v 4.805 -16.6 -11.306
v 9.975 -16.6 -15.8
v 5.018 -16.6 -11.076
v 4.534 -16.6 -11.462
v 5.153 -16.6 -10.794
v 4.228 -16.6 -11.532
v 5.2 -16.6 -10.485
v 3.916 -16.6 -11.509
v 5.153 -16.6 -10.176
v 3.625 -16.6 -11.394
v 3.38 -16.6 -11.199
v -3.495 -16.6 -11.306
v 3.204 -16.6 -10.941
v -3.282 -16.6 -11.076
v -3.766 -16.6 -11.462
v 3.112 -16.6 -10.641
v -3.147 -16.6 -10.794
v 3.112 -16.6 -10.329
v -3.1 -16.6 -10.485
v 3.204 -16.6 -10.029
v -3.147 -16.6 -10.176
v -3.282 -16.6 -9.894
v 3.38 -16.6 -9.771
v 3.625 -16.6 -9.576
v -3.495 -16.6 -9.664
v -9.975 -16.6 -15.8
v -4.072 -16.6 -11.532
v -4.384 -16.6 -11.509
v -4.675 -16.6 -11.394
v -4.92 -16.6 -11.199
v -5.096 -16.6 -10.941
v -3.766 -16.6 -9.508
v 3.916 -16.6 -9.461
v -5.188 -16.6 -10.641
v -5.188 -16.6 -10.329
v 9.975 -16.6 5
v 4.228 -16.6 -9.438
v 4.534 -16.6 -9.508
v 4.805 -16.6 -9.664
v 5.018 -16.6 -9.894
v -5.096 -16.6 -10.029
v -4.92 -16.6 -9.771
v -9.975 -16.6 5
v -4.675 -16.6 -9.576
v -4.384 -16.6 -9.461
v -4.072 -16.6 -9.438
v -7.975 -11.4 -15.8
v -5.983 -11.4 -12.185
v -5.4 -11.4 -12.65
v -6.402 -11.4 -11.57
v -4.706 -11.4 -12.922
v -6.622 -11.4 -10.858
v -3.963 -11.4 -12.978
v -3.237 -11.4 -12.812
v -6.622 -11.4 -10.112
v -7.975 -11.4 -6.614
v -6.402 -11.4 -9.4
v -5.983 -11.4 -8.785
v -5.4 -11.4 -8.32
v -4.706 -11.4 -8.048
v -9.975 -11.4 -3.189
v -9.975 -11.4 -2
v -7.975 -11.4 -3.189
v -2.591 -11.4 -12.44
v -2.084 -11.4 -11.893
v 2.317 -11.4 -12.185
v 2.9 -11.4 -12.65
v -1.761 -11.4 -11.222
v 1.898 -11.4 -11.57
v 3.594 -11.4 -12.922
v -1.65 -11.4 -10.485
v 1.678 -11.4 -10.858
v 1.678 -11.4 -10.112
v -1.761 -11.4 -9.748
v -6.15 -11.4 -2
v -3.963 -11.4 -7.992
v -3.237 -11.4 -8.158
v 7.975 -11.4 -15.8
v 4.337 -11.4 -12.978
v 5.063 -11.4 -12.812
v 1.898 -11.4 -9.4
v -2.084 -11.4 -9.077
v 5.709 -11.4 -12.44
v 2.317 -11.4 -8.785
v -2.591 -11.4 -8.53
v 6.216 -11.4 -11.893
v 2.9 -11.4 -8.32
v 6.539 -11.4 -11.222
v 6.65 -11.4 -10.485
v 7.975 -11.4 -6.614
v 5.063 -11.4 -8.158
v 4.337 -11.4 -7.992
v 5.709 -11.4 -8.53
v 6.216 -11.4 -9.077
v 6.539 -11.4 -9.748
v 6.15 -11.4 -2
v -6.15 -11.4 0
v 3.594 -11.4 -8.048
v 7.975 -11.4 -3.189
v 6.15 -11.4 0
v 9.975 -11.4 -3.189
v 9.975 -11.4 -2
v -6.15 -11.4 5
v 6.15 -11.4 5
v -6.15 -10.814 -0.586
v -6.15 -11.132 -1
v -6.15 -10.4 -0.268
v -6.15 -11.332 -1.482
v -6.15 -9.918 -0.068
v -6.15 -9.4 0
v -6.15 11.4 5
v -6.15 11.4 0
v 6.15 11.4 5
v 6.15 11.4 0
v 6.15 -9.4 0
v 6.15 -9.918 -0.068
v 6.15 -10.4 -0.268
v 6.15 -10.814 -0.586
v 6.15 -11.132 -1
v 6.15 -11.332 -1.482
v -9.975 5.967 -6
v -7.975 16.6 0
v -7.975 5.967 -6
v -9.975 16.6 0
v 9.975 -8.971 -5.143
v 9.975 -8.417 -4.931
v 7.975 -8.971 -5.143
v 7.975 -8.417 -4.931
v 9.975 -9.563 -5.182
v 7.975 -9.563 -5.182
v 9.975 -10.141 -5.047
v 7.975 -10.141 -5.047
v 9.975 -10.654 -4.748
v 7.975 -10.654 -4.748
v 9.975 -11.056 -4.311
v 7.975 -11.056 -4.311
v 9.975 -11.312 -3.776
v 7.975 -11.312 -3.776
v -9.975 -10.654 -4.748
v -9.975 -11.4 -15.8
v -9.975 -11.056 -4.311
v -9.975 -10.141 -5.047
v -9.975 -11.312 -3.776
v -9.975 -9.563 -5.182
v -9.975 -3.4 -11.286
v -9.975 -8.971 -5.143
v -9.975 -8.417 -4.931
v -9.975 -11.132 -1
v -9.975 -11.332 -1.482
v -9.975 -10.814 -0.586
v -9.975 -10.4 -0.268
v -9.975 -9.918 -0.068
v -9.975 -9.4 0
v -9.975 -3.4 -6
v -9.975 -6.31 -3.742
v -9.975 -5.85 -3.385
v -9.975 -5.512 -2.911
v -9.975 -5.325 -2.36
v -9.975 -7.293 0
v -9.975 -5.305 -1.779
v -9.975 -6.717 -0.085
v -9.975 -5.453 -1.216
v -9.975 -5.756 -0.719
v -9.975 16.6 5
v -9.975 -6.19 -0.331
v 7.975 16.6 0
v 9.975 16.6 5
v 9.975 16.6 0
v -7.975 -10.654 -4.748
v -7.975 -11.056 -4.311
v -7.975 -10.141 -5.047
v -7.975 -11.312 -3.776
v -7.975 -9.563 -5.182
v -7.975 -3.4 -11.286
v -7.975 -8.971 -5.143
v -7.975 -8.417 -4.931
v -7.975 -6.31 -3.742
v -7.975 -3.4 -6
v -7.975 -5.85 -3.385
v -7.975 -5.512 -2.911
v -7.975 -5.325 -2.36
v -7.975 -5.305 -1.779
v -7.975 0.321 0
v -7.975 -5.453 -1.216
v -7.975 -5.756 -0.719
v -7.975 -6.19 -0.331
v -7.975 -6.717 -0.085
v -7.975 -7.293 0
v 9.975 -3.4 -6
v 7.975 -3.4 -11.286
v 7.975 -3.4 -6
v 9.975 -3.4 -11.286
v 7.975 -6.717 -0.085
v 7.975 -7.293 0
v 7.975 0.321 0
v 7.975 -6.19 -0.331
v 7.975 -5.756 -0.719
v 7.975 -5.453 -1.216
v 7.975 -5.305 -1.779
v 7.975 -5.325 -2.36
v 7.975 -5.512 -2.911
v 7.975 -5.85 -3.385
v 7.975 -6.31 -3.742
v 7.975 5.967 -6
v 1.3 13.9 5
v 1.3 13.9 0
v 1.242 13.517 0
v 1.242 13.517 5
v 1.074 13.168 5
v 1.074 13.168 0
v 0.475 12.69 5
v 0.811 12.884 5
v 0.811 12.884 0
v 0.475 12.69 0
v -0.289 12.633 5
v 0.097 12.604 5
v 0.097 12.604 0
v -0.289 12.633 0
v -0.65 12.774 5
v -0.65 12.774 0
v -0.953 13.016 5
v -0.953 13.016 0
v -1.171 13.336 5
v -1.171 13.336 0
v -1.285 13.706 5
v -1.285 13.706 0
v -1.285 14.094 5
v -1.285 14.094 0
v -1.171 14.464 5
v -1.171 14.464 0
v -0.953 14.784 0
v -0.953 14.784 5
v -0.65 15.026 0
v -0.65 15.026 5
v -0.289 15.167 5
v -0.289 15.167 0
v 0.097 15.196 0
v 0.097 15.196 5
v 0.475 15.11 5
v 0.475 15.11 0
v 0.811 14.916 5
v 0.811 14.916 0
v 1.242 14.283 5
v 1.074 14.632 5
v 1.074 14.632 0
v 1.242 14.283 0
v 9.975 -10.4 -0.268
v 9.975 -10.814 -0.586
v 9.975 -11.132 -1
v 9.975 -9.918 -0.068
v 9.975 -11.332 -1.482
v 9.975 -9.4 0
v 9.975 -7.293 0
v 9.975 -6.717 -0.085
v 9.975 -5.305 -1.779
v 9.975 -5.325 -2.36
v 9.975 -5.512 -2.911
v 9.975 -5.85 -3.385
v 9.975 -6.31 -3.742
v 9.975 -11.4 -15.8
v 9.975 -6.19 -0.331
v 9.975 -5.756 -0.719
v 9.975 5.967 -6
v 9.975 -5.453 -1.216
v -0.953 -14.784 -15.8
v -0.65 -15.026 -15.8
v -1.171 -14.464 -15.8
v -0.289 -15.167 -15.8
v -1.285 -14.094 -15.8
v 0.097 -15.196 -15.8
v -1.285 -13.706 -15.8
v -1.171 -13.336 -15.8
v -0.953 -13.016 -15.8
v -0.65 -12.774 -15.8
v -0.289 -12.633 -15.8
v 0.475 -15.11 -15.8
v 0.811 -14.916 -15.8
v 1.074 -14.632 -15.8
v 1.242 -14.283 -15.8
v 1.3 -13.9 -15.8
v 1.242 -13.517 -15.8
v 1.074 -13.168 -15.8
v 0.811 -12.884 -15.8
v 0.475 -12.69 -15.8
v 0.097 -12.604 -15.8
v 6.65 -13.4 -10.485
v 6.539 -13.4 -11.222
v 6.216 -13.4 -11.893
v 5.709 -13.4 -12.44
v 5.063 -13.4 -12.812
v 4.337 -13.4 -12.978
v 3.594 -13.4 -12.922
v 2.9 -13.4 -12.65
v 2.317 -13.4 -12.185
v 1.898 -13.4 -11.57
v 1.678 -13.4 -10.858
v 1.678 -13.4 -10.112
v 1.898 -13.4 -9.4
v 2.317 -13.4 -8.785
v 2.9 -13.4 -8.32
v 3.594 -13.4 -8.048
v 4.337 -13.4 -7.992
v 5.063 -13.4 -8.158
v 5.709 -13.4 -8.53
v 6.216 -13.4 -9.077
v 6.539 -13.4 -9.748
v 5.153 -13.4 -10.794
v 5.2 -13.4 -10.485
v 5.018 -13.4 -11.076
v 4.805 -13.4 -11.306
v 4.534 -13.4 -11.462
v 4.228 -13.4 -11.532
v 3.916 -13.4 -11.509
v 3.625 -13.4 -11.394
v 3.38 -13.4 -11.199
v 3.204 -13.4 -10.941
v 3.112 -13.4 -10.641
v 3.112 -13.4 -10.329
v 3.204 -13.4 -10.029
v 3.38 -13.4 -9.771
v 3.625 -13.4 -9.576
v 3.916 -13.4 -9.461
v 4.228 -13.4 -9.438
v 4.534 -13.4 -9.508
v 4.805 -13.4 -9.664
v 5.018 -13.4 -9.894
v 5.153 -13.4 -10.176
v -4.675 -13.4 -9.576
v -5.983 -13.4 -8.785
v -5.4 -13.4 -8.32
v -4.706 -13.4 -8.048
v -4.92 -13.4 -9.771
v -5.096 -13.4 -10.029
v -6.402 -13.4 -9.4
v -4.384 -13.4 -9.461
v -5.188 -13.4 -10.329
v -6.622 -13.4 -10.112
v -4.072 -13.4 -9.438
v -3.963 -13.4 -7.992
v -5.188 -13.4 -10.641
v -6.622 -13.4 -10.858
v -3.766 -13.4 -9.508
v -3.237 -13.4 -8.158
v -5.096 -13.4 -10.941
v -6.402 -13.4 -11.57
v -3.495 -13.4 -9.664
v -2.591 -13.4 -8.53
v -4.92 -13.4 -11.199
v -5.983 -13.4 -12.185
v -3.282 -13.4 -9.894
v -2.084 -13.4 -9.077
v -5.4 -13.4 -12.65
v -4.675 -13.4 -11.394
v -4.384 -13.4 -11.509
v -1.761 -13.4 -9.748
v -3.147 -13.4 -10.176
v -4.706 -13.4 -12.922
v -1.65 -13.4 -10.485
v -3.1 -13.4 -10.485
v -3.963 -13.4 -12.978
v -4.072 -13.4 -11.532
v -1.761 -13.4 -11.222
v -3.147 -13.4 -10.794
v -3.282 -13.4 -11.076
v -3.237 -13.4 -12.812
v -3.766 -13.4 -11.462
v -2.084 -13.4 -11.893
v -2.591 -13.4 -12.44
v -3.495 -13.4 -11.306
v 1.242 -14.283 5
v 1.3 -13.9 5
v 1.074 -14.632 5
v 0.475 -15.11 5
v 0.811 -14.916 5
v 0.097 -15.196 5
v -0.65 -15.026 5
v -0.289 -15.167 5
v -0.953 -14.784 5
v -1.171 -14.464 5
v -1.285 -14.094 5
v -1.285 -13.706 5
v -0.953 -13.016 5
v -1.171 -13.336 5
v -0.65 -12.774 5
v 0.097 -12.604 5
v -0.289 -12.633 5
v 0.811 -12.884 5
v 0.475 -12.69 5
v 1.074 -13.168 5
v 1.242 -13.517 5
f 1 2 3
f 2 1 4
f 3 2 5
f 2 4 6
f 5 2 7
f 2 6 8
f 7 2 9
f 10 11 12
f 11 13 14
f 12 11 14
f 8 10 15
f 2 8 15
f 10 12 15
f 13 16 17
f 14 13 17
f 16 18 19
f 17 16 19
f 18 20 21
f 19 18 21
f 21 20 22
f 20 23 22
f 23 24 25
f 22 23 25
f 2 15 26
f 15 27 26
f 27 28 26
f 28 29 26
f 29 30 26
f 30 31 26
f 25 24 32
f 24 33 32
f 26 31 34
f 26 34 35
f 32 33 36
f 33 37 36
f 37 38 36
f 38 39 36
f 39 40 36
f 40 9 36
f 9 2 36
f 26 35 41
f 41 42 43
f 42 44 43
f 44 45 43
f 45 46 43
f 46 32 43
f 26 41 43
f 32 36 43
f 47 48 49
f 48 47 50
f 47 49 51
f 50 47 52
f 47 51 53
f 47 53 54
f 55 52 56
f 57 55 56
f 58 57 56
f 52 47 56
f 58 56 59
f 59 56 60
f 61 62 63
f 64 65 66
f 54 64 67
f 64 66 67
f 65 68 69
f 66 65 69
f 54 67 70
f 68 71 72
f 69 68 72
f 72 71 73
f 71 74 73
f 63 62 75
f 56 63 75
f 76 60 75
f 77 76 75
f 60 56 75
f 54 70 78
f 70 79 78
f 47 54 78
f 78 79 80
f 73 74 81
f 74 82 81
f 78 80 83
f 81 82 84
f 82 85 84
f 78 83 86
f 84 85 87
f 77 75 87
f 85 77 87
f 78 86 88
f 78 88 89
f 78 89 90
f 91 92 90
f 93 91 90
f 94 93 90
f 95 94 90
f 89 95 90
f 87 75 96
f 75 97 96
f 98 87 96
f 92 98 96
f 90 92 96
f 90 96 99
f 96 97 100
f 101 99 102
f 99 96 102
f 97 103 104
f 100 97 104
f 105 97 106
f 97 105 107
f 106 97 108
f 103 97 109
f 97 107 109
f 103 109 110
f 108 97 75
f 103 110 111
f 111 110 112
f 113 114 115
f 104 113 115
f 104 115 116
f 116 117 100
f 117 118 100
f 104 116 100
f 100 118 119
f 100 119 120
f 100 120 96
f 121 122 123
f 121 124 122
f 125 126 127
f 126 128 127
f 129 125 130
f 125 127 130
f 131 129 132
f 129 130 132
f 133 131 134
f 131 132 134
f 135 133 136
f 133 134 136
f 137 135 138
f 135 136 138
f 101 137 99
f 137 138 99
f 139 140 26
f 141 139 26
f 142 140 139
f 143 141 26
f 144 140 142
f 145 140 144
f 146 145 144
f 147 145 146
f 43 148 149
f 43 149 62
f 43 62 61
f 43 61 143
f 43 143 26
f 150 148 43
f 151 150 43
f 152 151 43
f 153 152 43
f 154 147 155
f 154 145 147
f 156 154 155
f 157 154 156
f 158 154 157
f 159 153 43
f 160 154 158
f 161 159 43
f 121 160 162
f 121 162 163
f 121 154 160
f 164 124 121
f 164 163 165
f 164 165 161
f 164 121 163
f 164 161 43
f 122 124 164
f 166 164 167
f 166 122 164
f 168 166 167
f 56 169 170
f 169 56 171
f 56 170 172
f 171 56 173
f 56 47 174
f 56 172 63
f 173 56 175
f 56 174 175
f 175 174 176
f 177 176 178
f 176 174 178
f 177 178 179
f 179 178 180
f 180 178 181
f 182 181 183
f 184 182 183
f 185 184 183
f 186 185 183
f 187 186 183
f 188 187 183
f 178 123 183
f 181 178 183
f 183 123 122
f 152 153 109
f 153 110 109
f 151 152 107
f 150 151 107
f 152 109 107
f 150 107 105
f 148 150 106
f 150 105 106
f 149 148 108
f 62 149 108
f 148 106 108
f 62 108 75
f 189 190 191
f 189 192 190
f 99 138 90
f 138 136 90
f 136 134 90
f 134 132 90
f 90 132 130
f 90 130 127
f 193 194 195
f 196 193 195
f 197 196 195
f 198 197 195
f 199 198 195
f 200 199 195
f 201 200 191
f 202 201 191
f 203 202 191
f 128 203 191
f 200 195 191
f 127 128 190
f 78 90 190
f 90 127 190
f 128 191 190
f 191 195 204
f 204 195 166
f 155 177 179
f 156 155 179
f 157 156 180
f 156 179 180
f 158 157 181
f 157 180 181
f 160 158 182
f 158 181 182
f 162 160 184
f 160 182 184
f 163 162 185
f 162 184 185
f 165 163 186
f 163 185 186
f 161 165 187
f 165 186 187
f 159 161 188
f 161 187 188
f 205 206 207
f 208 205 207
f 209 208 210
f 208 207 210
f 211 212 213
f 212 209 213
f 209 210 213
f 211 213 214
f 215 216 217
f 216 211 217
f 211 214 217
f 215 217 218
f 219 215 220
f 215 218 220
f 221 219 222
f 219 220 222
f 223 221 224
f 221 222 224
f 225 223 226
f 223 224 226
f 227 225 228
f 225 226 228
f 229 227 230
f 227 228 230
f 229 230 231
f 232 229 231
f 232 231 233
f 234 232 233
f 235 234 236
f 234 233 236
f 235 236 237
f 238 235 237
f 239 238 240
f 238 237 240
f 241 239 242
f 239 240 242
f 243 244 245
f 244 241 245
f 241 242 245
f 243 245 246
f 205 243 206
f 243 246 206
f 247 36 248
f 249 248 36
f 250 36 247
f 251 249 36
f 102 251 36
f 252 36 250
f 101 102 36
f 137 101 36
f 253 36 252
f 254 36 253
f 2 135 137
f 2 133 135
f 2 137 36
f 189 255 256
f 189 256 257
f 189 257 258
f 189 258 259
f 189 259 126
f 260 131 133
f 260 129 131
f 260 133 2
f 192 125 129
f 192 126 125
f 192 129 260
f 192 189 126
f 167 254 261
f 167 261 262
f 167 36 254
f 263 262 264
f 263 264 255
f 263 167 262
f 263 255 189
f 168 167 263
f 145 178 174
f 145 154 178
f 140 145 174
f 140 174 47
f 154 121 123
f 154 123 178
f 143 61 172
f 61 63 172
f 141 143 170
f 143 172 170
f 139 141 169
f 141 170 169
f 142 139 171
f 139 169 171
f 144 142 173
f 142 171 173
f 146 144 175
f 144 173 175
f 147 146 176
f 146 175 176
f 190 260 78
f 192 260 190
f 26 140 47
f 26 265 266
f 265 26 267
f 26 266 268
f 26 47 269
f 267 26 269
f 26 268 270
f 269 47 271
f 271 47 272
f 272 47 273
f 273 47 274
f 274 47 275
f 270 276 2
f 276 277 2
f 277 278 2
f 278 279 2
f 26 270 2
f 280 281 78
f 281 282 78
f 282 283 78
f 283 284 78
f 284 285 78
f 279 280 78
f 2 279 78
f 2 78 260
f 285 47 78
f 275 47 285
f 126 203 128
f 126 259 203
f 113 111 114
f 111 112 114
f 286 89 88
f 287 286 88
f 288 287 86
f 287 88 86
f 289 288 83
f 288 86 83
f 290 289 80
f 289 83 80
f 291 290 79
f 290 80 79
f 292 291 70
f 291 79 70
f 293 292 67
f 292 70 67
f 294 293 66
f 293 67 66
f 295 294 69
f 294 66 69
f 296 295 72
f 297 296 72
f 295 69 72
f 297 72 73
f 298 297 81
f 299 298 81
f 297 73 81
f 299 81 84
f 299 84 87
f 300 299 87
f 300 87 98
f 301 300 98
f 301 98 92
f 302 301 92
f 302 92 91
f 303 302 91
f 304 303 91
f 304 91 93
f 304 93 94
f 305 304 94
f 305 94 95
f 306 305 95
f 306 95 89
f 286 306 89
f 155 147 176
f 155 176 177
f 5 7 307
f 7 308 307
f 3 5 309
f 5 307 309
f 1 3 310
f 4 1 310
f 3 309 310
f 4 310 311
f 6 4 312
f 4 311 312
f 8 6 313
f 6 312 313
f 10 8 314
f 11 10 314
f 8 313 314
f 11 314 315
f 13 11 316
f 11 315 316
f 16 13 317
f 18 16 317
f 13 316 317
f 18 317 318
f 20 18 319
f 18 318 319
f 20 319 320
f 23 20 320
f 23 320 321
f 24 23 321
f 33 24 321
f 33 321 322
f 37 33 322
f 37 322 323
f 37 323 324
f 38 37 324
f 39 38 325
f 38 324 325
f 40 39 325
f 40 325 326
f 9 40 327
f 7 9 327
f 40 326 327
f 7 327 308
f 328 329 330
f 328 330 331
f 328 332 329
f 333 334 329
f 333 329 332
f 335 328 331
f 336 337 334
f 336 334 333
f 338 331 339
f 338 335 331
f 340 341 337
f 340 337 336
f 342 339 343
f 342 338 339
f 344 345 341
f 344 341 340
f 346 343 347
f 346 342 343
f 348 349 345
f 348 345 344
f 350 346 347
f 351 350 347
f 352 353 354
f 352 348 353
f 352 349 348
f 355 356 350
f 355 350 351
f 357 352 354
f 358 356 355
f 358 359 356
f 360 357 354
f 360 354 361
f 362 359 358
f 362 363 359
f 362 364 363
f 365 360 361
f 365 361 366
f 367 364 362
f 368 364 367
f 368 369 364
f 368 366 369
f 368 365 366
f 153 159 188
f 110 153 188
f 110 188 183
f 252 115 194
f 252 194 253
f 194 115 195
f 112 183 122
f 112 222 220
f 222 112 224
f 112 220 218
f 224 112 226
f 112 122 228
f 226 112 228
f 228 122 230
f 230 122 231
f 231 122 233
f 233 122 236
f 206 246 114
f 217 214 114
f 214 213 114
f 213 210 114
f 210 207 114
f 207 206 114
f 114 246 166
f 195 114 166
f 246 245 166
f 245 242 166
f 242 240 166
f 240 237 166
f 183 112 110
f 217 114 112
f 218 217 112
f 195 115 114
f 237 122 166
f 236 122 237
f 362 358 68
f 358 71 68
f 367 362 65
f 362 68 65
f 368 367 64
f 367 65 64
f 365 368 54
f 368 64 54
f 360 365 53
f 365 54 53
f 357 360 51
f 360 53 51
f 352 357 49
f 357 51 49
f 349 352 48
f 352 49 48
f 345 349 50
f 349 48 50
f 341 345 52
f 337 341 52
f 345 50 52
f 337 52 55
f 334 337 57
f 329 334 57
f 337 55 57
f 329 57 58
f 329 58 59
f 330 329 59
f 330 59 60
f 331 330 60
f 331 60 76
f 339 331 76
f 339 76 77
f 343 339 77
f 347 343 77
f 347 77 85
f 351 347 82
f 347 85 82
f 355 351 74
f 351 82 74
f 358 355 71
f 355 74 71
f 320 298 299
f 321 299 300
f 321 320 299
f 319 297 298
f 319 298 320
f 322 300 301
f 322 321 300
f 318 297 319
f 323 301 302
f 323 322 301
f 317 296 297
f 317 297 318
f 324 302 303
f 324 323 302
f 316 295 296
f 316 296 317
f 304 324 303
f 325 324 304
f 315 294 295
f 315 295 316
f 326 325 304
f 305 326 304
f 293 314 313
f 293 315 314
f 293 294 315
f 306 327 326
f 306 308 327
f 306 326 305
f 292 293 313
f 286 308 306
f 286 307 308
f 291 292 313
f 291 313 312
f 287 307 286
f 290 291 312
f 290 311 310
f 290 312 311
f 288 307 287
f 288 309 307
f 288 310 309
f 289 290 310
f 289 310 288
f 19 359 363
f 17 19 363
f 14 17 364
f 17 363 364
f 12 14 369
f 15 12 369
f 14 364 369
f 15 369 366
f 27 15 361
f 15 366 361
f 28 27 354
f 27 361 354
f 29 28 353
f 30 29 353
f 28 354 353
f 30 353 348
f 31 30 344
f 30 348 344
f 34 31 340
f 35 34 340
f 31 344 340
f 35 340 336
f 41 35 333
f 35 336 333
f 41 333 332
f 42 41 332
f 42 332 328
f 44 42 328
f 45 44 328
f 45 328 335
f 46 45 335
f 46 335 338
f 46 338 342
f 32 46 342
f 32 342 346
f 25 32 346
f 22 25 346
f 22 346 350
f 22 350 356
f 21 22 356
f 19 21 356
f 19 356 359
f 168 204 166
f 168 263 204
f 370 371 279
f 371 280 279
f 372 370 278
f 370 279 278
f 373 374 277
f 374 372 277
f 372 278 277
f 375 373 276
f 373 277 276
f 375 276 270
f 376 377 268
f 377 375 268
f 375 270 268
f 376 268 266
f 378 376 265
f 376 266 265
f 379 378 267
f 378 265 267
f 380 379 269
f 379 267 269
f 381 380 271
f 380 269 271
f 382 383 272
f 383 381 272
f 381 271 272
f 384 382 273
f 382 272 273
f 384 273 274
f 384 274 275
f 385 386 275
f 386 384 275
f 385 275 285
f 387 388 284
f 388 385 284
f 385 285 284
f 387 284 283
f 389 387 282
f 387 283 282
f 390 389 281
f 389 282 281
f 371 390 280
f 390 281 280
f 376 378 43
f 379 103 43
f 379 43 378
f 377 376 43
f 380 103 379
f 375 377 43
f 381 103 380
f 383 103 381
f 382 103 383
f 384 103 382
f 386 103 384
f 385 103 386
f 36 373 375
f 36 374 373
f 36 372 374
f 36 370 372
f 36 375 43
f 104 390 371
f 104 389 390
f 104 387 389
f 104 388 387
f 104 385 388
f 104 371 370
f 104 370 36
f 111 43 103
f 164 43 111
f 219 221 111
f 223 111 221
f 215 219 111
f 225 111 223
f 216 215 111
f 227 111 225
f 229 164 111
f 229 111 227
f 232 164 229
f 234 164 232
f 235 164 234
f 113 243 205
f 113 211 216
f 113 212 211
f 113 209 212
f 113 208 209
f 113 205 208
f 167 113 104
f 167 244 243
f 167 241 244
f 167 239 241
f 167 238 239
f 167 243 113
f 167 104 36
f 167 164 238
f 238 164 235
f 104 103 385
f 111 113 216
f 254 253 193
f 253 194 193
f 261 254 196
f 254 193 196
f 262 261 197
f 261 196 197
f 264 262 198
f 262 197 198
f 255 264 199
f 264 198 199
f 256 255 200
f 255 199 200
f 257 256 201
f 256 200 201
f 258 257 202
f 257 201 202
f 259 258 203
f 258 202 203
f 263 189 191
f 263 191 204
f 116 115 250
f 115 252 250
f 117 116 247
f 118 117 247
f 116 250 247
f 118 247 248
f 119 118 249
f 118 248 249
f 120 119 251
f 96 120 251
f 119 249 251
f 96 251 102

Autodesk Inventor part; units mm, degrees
ref_plane "YZ Plane" through (0, 0, 0) normal (1, 0, 0) x (0, 1, 0)
sketch "Sketch1" plane through (0, 0, 0) normal (0, 0, 1) x (1, 0, 0)
  line L0 (-9.975, 16.6) -> (9.975, 16.6)
  line L1 (9.975, 16.6) -> (9.975, -16.6)
  line L2 (9.975, -16.6) -> (-9.975, -16.6)
  line L3 (-9.975, -16.6) -> (-9.975, 16.6)
  line L4 (0, 0) -> (0, 11.4) construction
  line L5 (0, 0) -> (15.5803, 0) construction
  line L6 (-6.15, 11.4) -> (6.15, 11.4)
  line L7 (6.15, 11.4) -> (6.15, -11.4)
  line L8 (6.15, -11.4) -> (-6.15, -11.4)
  line L9 (-6.15, -11.4) -> (-6.15, 11.4)
  circle A0 centre (0, 13.9) radius 1.3
  circle A1 centre (0, -13.9) radius 1.3
  line L10 (-15.0861, 0) -> (20.6914, 0) projected
  line L11 (9.975, -16.6) -> (-9.975, -16.6)
  line L12 (-9.975, -16.6) -> (-9.975, -11.4)
  line L13 (-9.975, -11.4) -> (9.975, -11.4)
  line L14 (9.975, -11.4) -> (9.975, -16.6)
  line L15 (0, 11.4) -> (0, 13.9) construction
  point P0 (0, 16.6)
  dimension "d0" = 2.6
  dimension "d1" = 27.8
  dimension "d4" = 12.3
  dimension "d5" = 2.5
  dimension "d6" = 2.5
  dimension "d7" = 22.8
  dimension "d11" = 2.7
  dimension "d12" = 2.7
  dimension "d14" = 3.825
extrude "Extrusion1" add sketch "Sketch1" along normal blind 5 contours L0 L1 L10 L7 L6 L9 L3 | L10 L9 L13 L3 | L1 L13 L7 L10 | L13 L8 L1 L2 L3
extrude "Extrusion2" add sketch "Sketch1" against normal blind 15.8 contours L13 L8 L1 L2 L3
sketch "Sketch2" plane through (-6.15, -11.4, 5) normal (0, 1, 0) x (1, 0, 0)
  circle A0 centre (10.3, 15.485) radius 1.05
  circle A1 centre (2, 15.485) radius 1.05
  line L0 (-3.825, 20.8) -> (16.125, 20.8) projected
  line L1 (-3.825, 5) -> (-3.825, 20.8) projected
  line L2 (2, 15.485) -> (10.3, 15.485) construction
  line L3 (10.3, 15.485) -> (6.15, 15.485) construction
  line L4 (6.15, 15.485) -> (6.15, 20.8) construction
  point P0 (6.15, 5)
  dimension "d19" = 2.1
  dimension "d20" = 0
  dimension "d21" = 5.315
  dimension "d22" = 8.3
extrude "Extrusion3" cut sketch "Sketch2" against normal blind 10
sketch "Sketch3" plane through (-6.15, -11.4, 5) normal (0, 1, 0) x (1, 0, 0)
  circle A0 centre (10.3, 15.485) radius 1.05 projected
  circle A1 centre (10.3, 15.485) radius 2.5
  circle A2 centre (2, 15.485) radius 1.05 projected
  circle A3 centre (2, 15.485) radius 2.5
  point P0 (6.15, 5)
  dimension "d26" = 5
extrude "Extrusion4" cut sketch "Sketch3" against normal blind 2
sketch "Sketch4" plane through (9.975, -11.4, 0) normal (1, 0, 0) x (0, 0, -1)
  line L0 (0, 0) -> (15.8, 0) projected
  line L1 (0, 0) -> (0, 28) projected
  line L2 (15.8, 0) -> (0, 28)
  line L3 (0, 28) -> (0, 11.7214)
  line L4 (0, 11.7214) -> (6.6142, 0)
  line L5 (6.6142, 0) -> (15.8, 0)
  line L6 (0, 28) -> (-5, 28) projected
  line L7 (0, 11.7214) -> (0, 28)
  line L8 (6, 17.3671) -> (11.2857, 17.3671)
  line L9 (11.2857, 17.3671) -> (11.2857, 8)
  line L10 (11.2857, 8) -> (6, 8)
  line L11 (6, 8) -> (6, 17.3671)
  point P0 (0, 11.4)
  dimension "d29" = 8
  dimension "d33" = 8
  dimension "d34" = 6
ref_plane "Work Plane1" through (-1.325, -11.4, 0) normal (-1, 0, 0) x (0, 0, 1)
extrude "Extrusion5" add sketch "Sketch4" against normal blind 2 contours L4 L1 L2 L11 L10 L0
ref_plane "Work Plane3" through (0, -16.6, 5) normal (-1, 0, 0) x (0, 0, 1)
mirror "Mirror1" about plane through (0, -16.6, 5) normal (-1, 0, 0) of "Extrusion5"
fillet "Fillet1" radius 2 6 edges at (8.975, 0.3214, 0) (8.975, -11.4, -6.6142) (8.0625, -11.4, 0) (-8.975, -11.4, -6.6142) (-8.0625, -11.4, 0) (-8.975, 0.3214, 0)
properties part number "GrabberServoHolder_3DPrint"
